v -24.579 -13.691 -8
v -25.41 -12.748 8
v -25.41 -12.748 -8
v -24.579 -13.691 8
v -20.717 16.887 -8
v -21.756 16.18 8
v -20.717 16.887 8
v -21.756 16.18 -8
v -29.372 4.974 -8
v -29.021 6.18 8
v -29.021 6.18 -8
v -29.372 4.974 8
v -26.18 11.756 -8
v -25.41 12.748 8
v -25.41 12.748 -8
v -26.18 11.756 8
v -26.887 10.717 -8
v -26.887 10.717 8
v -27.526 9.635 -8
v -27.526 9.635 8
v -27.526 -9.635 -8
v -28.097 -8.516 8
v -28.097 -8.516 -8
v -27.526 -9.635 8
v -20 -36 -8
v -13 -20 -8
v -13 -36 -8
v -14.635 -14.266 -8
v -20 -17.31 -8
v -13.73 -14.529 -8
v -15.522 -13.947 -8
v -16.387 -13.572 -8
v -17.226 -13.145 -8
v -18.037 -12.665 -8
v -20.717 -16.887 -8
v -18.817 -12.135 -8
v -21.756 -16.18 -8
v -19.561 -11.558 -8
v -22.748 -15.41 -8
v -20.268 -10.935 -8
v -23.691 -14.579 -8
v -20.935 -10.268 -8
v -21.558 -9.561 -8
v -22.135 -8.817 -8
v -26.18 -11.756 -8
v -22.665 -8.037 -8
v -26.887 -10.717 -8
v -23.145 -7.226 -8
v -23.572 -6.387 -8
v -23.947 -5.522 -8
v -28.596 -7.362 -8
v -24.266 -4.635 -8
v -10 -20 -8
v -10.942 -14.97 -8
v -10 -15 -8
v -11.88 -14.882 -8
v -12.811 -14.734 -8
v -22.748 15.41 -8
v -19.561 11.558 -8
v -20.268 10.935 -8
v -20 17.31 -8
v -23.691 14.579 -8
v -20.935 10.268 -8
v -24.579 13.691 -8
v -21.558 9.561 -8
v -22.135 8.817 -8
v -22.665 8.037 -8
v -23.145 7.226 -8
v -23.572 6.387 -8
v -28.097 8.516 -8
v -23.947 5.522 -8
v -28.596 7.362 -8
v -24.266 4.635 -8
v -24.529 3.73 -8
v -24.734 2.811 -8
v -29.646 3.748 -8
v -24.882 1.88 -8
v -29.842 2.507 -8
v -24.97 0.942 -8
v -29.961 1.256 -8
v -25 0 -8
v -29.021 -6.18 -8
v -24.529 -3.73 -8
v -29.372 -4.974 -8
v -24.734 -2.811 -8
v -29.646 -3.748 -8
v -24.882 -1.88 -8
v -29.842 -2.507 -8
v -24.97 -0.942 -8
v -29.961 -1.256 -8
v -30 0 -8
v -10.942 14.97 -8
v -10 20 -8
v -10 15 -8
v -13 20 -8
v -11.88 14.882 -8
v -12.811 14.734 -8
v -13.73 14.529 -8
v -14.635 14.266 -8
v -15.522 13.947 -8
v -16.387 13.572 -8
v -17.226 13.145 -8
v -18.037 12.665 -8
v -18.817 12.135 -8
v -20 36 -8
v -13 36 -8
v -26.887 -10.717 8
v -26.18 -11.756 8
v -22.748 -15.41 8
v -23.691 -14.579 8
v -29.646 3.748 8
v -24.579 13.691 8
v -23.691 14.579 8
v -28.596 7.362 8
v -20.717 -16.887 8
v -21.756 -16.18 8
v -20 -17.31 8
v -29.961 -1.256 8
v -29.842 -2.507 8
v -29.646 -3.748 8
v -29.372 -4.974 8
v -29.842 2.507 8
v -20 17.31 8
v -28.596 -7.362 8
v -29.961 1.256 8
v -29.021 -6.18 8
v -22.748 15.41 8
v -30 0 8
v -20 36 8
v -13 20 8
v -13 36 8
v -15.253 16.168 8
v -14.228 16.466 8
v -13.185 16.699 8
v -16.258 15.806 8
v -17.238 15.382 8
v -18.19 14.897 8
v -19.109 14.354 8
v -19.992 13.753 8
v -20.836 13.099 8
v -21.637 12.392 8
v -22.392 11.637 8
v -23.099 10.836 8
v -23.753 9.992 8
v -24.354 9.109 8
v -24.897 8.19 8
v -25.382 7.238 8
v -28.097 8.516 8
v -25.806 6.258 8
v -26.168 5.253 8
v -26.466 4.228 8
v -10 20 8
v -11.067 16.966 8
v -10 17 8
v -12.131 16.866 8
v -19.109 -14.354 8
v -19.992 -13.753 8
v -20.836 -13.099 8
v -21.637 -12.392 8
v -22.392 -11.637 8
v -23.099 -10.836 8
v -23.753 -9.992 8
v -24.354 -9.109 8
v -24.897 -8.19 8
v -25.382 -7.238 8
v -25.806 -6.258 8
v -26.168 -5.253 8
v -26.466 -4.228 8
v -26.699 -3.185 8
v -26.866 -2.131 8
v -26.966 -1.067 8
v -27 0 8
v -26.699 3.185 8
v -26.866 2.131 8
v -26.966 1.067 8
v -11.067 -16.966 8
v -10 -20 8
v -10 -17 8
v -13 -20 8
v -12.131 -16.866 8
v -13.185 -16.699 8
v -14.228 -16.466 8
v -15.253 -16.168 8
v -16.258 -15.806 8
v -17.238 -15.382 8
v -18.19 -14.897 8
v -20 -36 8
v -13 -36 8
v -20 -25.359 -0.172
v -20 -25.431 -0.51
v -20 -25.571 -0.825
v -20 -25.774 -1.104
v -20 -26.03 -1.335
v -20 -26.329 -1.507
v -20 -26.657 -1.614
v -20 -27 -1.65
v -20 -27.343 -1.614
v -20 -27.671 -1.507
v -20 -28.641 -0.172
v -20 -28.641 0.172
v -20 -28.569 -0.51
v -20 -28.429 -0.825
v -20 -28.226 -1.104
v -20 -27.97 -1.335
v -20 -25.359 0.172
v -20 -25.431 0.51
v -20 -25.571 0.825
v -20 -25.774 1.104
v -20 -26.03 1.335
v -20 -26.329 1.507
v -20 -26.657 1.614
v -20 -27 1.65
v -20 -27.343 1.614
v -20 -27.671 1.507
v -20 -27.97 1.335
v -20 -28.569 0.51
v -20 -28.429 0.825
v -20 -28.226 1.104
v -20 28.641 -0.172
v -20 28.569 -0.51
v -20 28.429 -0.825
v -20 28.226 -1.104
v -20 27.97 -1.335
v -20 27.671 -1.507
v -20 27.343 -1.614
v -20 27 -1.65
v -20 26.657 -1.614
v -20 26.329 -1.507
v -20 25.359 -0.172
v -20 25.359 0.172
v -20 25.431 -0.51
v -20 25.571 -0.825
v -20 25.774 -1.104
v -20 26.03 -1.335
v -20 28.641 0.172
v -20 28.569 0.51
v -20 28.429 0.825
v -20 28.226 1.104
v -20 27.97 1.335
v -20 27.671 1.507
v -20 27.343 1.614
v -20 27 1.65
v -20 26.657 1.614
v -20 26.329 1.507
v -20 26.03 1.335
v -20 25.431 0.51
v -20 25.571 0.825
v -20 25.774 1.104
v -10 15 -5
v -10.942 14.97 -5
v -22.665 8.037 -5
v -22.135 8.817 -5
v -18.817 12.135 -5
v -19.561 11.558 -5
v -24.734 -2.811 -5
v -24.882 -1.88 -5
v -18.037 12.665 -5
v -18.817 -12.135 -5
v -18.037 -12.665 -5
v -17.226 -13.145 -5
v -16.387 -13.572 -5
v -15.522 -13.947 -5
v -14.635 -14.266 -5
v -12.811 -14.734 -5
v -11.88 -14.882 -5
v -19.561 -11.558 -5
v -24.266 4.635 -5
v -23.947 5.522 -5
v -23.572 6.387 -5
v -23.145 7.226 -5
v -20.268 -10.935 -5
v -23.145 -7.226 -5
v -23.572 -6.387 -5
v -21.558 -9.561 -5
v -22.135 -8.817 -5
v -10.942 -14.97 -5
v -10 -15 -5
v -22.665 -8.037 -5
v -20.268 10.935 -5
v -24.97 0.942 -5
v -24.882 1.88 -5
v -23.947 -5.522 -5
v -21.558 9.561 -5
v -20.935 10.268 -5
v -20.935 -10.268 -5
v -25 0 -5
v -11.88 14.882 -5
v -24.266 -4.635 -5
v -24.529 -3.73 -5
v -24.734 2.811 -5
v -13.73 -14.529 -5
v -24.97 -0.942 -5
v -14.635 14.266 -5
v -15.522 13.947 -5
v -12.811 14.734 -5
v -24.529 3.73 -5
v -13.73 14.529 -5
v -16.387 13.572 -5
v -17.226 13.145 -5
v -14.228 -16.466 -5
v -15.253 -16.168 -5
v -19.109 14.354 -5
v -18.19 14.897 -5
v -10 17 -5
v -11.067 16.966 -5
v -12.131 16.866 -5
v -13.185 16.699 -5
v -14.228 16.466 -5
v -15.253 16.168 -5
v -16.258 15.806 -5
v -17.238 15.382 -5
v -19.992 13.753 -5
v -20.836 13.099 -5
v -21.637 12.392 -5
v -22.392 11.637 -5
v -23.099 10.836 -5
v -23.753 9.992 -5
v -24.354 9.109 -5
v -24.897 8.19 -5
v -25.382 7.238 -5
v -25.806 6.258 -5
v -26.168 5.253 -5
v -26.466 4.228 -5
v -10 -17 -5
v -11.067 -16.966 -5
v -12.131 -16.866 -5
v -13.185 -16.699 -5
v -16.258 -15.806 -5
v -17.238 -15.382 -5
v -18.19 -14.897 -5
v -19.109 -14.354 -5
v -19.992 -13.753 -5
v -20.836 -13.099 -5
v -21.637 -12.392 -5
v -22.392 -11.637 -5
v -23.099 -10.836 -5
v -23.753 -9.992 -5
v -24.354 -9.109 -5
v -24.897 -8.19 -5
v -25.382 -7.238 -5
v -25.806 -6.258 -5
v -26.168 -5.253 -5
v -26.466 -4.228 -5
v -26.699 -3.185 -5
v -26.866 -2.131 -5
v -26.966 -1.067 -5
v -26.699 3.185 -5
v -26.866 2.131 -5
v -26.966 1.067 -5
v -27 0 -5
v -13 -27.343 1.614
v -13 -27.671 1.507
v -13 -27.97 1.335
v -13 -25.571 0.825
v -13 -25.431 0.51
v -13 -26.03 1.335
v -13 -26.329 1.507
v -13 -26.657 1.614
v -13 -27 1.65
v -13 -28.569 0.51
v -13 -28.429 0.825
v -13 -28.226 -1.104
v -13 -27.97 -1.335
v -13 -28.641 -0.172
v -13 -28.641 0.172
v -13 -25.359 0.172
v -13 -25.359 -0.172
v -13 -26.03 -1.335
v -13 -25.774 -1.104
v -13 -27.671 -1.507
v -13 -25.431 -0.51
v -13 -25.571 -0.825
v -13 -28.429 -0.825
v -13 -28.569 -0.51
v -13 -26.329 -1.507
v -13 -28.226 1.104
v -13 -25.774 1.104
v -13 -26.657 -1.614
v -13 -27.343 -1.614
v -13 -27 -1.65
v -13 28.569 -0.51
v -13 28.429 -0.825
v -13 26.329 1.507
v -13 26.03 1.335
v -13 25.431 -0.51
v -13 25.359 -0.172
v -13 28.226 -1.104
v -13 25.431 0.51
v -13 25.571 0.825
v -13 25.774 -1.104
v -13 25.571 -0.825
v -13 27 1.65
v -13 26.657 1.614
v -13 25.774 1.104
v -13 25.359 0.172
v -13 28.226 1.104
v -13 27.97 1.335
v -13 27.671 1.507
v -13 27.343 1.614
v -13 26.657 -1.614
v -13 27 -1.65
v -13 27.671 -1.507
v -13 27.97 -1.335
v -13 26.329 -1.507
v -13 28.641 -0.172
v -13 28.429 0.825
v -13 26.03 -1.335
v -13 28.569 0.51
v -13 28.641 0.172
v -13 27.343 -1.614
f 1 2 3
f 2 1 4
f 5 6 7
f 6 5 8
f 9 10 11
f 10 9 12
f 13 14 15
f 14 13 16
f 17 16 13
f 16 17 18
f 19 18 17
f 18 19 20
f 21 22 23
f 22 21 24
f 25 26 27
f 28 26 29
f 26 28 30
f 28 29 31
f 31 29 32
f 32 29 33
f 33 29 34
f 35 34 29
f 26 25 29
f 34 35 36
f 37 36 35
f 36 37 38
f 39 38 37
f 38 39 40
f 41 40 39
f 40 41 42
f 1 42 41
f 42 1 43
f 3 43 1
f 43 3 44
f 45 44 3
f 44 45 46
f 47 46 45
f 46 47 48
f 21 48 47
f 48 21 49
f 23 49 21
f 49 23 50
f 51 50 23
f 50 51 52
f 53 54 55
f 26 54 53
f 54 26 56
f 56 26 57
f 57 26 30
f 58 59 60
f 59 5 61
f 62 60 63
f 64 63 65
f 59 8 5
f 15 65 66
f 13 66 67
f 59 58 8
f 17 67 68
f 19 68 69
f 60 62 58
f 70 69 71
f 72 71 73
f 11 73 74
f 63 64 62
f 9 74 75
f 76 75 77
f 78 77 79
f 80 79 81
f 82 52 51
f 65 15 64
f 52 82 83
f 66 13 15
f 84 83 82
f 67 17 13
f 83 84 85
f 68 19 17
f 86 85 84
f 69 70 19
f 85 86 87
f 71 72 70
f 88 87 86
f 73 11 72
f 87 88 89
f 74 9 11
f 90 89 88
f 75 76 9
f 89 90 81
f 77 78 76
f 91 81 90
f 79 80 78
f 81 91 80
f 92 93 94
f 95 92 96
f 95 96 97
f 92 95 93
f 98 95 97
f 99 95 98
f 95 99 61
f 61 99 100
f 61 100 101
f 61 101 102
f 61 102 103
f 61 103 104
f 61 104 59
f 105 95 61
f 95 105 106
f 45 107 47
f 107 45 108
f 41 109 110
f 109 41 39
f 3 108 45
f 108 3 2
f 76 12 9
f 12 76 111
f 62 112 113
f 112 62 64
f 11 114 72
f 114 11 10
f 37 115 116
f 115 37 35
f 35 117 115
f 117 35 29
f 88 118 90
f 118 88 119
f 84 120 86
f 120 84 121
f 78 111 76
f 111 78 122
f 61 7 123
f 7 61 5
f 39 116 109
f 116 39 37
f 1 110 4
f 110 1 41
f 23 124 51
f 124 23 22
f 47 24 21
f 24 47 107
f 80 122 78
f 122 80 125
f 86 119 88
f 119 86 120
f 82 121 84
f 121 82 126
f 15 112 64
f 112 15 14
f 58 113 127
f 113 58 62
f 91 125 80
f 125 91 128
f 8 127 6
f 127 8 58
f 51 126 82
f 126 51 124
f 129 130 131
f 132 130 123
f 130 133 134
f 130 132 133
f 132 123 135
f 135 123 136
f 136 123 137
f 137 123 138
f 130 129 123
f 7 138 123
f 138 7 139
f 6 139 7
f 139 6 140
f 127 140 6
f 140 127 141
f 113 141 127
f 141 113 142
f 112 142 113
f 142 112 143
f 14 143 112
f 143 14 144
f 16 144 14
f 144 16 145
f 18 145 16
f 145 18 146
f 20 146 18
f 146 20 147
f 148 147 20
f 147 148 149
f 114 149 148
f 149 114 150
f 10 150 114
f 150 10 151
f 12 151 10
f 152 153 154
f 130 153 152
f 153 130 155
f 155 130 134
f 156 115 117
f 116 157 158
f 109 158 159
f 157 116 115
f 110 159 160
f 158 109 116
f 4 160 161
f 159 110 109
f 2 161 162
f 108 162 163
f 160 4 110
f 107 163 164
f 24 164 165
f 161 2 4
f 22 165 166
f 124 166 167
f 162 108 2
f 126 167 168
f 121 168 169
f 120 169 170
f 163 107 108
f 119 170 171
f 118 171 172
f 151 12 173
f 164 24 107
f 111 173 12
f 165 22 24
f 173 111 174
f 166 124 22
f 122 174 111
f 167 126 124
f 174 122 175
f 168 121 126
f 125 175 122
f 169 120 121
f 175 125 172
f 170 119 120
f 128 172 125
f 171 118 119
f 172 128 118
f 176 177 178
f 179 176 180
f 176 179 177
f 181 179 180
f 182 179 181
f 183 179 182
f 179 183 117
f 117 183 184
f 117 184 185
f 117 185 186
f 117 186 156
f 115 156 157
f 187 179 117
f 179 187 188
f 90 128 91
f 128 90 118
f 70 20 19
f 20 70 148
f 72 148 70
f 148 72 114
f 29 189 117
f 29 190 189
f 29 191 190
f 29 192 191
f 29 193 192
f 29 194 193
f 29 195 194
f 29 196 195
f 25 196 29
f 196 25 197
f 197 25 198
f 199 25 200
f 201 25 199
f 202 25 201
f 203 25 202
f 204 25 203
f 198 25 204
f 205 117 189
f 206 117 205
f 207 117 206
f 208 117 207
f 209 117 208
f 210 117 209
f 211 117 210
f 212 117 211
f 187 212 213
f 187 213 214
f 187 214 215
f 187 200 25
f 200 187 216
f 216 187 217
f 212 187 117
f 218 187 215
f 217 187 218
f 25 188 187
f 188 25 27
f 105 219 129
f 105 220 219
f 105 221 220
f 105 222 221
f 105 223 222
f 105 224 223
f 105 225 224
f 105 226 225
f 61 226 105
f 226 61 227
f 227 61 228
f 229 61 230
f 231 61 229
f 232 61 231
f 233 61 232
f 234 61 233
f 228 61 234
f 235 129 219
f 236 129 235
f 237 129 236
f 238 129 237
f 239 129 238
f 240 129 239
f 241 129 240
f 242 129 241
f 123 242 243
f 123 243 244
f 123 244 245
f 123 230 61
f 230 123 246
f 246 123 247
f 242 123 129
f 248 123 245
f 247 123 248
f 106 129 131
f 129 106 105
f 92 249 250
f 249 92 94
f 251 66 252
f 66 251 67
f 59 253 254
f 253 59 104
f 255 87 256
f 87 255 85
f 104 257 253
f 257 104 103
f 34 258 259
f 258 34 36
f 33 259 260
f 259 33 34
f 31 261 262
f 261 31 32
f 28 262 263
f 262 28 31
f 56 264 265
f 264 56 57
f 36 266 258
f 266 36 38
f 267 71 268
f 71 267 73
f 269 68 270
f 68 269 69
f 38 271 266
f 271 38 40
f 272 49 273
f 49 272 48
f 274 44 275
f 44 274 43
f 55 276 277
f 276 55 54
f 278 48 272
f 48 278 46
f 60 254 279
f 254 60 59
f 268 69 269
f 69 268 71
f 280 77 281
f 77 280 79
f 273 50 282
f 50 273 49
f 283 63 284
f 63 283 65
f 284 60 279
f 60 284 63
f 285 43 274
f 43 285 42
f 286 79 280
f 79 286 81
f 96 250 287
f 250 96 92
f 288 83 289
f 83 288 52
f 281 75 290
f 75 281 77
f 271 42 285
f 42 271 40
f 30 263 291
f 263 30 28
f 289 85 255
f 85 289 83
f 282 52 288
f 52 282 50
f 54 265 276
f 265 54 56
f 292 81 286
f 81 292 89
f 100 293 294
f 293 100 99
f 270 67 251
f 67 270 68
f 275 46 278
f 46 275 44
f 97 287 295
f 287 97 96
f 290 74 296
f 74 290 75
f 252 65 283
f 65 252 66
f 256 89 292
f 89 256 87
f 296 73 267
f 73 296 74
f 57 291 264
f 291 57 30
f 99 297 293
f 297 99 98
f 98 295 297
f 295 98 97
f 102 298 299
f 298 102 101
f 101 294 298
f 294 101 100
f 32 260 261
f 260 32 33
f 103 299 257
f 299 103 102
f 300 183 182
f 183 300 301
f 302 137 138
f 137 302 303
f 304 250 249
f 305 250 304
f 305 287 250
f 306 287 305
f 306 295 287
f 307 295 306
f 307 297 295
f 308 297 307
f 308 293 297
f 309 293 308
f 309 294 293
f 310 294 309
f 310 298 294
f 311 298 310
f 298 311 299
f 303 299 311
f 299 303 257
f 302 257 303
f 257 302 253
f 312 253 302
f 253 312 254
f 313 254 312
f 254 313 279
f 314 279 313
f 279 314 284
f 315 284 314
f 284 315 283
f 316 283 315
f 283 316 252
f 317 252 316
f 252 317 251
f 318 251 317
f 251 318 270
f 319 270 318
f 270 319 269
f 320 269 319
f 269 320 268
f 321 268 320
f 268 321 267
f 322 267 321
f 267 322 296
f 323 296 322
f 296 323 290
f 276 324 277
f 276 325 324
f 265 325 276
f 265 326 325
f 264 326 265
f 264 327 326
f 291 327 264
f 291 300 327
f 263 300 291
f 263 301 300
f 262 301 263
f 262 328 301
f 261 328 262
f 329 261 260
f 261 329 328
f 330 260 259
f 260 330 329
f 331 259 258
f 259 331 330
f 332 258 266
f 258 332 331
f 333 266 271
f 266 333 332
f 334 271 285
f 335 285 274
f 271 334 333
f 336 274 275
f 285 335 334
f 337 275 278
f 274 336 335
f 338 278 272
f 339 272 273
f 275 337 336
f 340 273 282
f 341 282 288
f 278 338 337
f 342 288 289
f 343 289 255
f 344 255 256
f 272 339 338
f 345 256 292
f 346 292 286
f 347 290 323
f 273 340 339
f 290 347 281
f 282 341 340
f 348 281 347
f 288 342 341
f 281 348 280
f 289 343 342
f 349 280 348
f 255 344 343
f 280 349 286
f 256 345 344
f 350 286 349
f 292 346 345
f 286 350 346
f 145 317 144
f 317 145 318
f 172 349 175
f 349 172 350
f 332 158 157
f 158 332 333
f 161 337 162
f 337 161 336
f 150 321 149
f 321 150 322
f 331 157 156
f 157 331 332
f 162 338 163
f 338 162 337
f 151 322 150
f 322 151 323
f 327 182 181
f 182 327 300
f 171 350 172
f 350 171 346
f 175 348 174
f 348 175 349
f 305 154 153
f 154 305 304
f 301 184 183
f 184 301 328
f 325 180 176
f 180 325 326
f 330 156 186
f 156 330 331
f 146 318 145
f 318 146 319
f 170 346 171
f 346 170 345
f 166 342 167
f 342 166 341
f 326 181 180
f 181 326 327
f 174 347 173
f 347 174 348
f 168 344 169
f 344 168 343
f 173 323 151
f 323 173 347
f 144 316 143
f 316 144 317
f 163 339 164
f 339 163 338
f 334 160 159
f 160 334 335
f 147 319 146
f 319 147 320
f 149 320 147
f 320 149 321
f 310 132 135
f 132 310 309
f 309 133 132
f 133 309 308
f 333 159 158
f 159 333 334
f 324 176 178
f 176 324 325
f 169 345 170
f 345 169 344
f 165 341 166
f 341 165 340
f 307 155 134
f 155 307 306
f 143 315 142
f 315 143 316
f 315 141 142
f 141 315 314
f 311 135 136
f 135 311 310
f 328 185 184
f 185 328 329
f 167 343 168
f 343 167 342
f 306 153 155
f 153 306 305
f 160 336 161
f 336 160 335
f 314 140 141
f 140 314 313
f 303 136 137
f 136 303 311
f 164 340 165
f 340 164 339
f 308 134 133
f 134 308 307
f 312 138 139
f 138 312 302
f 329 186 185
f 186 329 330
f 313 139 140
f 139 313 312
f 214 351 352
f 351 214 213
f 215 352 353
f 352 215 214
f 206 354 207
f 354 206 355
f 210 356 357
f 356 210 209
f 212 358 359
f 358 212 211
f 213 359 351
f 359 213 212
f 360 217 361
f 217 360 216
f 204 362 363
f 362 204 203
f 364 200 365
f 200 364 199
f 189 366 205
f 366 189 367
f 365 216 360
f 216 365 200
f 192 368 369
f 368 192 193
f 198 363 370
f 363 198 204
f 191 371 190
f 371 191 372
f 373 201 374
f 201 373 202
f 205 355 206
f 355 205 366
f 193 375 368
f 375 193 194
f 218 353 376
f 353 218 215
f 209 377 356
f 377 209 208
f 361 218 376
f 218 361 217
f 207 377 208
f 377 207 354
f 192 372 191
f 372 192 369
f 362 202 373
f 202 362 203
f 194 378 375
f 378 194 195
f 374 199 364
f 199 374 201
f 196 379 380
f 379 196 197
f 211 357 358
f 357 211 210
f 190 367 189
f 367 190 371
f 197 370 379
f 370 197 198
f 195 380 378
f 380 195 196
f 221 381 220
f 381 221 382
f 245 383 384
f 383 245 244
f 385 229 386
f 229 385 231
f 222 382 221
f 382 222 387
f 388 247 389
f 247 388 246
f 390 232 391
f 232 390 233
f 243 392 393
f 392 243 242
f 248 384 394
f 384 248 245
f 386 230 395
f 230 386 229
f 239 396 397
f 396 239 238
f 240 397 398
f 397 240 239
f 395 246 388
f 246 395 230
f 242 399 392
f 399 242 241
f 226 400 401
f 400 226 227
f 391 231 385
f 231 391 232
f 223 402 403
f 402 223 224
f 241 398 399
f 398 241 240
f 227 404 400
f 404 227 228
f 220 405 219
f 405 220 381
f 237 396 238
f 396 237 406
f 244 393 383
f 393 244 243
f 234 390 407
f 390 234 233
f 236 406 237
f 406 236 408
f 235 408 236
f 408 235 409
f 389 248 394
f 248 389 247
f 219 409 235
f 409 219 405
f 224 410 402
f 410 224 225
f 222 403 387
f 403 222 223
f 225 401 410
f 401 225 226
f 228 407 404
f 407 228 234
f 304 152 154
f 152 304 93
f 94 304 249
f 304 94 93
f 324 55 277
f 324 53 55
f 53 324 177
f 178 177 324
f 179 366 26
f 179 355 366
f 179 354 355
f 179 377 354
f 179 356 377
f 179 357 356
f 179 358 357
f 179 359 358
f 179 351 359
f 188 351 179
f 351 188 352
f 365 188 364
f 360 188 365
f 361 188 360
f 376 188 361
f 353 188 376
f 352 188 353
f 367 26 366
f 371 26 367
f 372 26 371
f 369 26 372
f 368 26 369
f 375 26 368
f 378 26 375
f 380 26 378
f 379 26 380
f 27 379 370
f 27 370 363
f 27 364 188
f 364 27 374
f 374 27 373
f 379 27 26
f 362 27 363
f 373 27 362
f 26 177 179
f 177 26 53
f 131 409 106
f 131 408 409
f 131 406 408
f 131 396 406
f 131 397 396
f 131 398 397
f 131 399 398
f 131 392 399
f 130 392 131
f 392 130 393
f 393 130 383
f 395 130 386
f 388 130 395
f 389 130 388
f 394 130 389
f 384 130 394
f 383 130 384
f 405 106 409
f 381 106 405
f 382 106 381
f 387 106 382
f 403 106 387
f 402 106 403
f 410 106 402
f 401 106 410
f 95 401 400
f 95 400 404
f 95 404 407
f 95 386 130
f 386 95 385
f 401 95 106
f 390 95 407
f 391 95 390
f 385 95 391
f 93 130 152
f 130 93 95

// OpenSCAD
heightpump=16;
radiusoutcyl=20; /*era 25*/
radiushole=17;
heightscrewcube=20;
widthscrewcube=22;
screwdistancefromborder=4;
tuberadius=2.3;
tubeposition=3.2;
skirtthickness=3;
skirtradius=radiushole-2;
screwradius=1.65;
separazione=-10;
enterangle=35;


translate([separazione,0,0]) rotate([180,0,0]) difference(){
union(){
cylinder(h=heightpump,r=radiusoutcyl,center=true,$fn=100);
    
/*nel translate dei due cubi successivi al posto di 25 era radiusoutcyl*/ 
color ("blue") translate ([0,25,0]) cube([heightscrewcube,widthscrewcube,heightpump],true); 
color ("blue") translate ([0,-25,0]) cube([heightscrewcube,widthscrewcube,heightpump],true);
}
 color("cyan") cylinder(h=heightpump*2,r=skirtradius,center=true,$fn=100);
translate([0,0,-skirtthickness]) color("red") cylinder(h=heightpump,r=radiushole,center=true,$fn=100);
translate([0,radiusoutcyl+widthscrewcube/2-screwdistancefromborder,0]) rotate([0,90,0]) cylinder(h=heightscrewcube+10,r=screwradius,$fn=30,center=true);
translate([0,-(radiusoutcyl+(widthscrewcube/2-screwdistancefromborder)),0]) rotate([0,90,0]) cylinder(h=heightscrewcube+10,r=screwradius,$fn=30,center=true);
translate([radiusoutcyl/2,0,0]) cube([radiusoutcyl,radiusoutcyl*2+heightscrewcube+20,heightpump+20],center=true);

/*5mm di rientranza*/
translate([0,35,0]) cube([6,30,heightpump],true);
translate([0,-35,0]) cube([6,30,heightpump],true);



}
